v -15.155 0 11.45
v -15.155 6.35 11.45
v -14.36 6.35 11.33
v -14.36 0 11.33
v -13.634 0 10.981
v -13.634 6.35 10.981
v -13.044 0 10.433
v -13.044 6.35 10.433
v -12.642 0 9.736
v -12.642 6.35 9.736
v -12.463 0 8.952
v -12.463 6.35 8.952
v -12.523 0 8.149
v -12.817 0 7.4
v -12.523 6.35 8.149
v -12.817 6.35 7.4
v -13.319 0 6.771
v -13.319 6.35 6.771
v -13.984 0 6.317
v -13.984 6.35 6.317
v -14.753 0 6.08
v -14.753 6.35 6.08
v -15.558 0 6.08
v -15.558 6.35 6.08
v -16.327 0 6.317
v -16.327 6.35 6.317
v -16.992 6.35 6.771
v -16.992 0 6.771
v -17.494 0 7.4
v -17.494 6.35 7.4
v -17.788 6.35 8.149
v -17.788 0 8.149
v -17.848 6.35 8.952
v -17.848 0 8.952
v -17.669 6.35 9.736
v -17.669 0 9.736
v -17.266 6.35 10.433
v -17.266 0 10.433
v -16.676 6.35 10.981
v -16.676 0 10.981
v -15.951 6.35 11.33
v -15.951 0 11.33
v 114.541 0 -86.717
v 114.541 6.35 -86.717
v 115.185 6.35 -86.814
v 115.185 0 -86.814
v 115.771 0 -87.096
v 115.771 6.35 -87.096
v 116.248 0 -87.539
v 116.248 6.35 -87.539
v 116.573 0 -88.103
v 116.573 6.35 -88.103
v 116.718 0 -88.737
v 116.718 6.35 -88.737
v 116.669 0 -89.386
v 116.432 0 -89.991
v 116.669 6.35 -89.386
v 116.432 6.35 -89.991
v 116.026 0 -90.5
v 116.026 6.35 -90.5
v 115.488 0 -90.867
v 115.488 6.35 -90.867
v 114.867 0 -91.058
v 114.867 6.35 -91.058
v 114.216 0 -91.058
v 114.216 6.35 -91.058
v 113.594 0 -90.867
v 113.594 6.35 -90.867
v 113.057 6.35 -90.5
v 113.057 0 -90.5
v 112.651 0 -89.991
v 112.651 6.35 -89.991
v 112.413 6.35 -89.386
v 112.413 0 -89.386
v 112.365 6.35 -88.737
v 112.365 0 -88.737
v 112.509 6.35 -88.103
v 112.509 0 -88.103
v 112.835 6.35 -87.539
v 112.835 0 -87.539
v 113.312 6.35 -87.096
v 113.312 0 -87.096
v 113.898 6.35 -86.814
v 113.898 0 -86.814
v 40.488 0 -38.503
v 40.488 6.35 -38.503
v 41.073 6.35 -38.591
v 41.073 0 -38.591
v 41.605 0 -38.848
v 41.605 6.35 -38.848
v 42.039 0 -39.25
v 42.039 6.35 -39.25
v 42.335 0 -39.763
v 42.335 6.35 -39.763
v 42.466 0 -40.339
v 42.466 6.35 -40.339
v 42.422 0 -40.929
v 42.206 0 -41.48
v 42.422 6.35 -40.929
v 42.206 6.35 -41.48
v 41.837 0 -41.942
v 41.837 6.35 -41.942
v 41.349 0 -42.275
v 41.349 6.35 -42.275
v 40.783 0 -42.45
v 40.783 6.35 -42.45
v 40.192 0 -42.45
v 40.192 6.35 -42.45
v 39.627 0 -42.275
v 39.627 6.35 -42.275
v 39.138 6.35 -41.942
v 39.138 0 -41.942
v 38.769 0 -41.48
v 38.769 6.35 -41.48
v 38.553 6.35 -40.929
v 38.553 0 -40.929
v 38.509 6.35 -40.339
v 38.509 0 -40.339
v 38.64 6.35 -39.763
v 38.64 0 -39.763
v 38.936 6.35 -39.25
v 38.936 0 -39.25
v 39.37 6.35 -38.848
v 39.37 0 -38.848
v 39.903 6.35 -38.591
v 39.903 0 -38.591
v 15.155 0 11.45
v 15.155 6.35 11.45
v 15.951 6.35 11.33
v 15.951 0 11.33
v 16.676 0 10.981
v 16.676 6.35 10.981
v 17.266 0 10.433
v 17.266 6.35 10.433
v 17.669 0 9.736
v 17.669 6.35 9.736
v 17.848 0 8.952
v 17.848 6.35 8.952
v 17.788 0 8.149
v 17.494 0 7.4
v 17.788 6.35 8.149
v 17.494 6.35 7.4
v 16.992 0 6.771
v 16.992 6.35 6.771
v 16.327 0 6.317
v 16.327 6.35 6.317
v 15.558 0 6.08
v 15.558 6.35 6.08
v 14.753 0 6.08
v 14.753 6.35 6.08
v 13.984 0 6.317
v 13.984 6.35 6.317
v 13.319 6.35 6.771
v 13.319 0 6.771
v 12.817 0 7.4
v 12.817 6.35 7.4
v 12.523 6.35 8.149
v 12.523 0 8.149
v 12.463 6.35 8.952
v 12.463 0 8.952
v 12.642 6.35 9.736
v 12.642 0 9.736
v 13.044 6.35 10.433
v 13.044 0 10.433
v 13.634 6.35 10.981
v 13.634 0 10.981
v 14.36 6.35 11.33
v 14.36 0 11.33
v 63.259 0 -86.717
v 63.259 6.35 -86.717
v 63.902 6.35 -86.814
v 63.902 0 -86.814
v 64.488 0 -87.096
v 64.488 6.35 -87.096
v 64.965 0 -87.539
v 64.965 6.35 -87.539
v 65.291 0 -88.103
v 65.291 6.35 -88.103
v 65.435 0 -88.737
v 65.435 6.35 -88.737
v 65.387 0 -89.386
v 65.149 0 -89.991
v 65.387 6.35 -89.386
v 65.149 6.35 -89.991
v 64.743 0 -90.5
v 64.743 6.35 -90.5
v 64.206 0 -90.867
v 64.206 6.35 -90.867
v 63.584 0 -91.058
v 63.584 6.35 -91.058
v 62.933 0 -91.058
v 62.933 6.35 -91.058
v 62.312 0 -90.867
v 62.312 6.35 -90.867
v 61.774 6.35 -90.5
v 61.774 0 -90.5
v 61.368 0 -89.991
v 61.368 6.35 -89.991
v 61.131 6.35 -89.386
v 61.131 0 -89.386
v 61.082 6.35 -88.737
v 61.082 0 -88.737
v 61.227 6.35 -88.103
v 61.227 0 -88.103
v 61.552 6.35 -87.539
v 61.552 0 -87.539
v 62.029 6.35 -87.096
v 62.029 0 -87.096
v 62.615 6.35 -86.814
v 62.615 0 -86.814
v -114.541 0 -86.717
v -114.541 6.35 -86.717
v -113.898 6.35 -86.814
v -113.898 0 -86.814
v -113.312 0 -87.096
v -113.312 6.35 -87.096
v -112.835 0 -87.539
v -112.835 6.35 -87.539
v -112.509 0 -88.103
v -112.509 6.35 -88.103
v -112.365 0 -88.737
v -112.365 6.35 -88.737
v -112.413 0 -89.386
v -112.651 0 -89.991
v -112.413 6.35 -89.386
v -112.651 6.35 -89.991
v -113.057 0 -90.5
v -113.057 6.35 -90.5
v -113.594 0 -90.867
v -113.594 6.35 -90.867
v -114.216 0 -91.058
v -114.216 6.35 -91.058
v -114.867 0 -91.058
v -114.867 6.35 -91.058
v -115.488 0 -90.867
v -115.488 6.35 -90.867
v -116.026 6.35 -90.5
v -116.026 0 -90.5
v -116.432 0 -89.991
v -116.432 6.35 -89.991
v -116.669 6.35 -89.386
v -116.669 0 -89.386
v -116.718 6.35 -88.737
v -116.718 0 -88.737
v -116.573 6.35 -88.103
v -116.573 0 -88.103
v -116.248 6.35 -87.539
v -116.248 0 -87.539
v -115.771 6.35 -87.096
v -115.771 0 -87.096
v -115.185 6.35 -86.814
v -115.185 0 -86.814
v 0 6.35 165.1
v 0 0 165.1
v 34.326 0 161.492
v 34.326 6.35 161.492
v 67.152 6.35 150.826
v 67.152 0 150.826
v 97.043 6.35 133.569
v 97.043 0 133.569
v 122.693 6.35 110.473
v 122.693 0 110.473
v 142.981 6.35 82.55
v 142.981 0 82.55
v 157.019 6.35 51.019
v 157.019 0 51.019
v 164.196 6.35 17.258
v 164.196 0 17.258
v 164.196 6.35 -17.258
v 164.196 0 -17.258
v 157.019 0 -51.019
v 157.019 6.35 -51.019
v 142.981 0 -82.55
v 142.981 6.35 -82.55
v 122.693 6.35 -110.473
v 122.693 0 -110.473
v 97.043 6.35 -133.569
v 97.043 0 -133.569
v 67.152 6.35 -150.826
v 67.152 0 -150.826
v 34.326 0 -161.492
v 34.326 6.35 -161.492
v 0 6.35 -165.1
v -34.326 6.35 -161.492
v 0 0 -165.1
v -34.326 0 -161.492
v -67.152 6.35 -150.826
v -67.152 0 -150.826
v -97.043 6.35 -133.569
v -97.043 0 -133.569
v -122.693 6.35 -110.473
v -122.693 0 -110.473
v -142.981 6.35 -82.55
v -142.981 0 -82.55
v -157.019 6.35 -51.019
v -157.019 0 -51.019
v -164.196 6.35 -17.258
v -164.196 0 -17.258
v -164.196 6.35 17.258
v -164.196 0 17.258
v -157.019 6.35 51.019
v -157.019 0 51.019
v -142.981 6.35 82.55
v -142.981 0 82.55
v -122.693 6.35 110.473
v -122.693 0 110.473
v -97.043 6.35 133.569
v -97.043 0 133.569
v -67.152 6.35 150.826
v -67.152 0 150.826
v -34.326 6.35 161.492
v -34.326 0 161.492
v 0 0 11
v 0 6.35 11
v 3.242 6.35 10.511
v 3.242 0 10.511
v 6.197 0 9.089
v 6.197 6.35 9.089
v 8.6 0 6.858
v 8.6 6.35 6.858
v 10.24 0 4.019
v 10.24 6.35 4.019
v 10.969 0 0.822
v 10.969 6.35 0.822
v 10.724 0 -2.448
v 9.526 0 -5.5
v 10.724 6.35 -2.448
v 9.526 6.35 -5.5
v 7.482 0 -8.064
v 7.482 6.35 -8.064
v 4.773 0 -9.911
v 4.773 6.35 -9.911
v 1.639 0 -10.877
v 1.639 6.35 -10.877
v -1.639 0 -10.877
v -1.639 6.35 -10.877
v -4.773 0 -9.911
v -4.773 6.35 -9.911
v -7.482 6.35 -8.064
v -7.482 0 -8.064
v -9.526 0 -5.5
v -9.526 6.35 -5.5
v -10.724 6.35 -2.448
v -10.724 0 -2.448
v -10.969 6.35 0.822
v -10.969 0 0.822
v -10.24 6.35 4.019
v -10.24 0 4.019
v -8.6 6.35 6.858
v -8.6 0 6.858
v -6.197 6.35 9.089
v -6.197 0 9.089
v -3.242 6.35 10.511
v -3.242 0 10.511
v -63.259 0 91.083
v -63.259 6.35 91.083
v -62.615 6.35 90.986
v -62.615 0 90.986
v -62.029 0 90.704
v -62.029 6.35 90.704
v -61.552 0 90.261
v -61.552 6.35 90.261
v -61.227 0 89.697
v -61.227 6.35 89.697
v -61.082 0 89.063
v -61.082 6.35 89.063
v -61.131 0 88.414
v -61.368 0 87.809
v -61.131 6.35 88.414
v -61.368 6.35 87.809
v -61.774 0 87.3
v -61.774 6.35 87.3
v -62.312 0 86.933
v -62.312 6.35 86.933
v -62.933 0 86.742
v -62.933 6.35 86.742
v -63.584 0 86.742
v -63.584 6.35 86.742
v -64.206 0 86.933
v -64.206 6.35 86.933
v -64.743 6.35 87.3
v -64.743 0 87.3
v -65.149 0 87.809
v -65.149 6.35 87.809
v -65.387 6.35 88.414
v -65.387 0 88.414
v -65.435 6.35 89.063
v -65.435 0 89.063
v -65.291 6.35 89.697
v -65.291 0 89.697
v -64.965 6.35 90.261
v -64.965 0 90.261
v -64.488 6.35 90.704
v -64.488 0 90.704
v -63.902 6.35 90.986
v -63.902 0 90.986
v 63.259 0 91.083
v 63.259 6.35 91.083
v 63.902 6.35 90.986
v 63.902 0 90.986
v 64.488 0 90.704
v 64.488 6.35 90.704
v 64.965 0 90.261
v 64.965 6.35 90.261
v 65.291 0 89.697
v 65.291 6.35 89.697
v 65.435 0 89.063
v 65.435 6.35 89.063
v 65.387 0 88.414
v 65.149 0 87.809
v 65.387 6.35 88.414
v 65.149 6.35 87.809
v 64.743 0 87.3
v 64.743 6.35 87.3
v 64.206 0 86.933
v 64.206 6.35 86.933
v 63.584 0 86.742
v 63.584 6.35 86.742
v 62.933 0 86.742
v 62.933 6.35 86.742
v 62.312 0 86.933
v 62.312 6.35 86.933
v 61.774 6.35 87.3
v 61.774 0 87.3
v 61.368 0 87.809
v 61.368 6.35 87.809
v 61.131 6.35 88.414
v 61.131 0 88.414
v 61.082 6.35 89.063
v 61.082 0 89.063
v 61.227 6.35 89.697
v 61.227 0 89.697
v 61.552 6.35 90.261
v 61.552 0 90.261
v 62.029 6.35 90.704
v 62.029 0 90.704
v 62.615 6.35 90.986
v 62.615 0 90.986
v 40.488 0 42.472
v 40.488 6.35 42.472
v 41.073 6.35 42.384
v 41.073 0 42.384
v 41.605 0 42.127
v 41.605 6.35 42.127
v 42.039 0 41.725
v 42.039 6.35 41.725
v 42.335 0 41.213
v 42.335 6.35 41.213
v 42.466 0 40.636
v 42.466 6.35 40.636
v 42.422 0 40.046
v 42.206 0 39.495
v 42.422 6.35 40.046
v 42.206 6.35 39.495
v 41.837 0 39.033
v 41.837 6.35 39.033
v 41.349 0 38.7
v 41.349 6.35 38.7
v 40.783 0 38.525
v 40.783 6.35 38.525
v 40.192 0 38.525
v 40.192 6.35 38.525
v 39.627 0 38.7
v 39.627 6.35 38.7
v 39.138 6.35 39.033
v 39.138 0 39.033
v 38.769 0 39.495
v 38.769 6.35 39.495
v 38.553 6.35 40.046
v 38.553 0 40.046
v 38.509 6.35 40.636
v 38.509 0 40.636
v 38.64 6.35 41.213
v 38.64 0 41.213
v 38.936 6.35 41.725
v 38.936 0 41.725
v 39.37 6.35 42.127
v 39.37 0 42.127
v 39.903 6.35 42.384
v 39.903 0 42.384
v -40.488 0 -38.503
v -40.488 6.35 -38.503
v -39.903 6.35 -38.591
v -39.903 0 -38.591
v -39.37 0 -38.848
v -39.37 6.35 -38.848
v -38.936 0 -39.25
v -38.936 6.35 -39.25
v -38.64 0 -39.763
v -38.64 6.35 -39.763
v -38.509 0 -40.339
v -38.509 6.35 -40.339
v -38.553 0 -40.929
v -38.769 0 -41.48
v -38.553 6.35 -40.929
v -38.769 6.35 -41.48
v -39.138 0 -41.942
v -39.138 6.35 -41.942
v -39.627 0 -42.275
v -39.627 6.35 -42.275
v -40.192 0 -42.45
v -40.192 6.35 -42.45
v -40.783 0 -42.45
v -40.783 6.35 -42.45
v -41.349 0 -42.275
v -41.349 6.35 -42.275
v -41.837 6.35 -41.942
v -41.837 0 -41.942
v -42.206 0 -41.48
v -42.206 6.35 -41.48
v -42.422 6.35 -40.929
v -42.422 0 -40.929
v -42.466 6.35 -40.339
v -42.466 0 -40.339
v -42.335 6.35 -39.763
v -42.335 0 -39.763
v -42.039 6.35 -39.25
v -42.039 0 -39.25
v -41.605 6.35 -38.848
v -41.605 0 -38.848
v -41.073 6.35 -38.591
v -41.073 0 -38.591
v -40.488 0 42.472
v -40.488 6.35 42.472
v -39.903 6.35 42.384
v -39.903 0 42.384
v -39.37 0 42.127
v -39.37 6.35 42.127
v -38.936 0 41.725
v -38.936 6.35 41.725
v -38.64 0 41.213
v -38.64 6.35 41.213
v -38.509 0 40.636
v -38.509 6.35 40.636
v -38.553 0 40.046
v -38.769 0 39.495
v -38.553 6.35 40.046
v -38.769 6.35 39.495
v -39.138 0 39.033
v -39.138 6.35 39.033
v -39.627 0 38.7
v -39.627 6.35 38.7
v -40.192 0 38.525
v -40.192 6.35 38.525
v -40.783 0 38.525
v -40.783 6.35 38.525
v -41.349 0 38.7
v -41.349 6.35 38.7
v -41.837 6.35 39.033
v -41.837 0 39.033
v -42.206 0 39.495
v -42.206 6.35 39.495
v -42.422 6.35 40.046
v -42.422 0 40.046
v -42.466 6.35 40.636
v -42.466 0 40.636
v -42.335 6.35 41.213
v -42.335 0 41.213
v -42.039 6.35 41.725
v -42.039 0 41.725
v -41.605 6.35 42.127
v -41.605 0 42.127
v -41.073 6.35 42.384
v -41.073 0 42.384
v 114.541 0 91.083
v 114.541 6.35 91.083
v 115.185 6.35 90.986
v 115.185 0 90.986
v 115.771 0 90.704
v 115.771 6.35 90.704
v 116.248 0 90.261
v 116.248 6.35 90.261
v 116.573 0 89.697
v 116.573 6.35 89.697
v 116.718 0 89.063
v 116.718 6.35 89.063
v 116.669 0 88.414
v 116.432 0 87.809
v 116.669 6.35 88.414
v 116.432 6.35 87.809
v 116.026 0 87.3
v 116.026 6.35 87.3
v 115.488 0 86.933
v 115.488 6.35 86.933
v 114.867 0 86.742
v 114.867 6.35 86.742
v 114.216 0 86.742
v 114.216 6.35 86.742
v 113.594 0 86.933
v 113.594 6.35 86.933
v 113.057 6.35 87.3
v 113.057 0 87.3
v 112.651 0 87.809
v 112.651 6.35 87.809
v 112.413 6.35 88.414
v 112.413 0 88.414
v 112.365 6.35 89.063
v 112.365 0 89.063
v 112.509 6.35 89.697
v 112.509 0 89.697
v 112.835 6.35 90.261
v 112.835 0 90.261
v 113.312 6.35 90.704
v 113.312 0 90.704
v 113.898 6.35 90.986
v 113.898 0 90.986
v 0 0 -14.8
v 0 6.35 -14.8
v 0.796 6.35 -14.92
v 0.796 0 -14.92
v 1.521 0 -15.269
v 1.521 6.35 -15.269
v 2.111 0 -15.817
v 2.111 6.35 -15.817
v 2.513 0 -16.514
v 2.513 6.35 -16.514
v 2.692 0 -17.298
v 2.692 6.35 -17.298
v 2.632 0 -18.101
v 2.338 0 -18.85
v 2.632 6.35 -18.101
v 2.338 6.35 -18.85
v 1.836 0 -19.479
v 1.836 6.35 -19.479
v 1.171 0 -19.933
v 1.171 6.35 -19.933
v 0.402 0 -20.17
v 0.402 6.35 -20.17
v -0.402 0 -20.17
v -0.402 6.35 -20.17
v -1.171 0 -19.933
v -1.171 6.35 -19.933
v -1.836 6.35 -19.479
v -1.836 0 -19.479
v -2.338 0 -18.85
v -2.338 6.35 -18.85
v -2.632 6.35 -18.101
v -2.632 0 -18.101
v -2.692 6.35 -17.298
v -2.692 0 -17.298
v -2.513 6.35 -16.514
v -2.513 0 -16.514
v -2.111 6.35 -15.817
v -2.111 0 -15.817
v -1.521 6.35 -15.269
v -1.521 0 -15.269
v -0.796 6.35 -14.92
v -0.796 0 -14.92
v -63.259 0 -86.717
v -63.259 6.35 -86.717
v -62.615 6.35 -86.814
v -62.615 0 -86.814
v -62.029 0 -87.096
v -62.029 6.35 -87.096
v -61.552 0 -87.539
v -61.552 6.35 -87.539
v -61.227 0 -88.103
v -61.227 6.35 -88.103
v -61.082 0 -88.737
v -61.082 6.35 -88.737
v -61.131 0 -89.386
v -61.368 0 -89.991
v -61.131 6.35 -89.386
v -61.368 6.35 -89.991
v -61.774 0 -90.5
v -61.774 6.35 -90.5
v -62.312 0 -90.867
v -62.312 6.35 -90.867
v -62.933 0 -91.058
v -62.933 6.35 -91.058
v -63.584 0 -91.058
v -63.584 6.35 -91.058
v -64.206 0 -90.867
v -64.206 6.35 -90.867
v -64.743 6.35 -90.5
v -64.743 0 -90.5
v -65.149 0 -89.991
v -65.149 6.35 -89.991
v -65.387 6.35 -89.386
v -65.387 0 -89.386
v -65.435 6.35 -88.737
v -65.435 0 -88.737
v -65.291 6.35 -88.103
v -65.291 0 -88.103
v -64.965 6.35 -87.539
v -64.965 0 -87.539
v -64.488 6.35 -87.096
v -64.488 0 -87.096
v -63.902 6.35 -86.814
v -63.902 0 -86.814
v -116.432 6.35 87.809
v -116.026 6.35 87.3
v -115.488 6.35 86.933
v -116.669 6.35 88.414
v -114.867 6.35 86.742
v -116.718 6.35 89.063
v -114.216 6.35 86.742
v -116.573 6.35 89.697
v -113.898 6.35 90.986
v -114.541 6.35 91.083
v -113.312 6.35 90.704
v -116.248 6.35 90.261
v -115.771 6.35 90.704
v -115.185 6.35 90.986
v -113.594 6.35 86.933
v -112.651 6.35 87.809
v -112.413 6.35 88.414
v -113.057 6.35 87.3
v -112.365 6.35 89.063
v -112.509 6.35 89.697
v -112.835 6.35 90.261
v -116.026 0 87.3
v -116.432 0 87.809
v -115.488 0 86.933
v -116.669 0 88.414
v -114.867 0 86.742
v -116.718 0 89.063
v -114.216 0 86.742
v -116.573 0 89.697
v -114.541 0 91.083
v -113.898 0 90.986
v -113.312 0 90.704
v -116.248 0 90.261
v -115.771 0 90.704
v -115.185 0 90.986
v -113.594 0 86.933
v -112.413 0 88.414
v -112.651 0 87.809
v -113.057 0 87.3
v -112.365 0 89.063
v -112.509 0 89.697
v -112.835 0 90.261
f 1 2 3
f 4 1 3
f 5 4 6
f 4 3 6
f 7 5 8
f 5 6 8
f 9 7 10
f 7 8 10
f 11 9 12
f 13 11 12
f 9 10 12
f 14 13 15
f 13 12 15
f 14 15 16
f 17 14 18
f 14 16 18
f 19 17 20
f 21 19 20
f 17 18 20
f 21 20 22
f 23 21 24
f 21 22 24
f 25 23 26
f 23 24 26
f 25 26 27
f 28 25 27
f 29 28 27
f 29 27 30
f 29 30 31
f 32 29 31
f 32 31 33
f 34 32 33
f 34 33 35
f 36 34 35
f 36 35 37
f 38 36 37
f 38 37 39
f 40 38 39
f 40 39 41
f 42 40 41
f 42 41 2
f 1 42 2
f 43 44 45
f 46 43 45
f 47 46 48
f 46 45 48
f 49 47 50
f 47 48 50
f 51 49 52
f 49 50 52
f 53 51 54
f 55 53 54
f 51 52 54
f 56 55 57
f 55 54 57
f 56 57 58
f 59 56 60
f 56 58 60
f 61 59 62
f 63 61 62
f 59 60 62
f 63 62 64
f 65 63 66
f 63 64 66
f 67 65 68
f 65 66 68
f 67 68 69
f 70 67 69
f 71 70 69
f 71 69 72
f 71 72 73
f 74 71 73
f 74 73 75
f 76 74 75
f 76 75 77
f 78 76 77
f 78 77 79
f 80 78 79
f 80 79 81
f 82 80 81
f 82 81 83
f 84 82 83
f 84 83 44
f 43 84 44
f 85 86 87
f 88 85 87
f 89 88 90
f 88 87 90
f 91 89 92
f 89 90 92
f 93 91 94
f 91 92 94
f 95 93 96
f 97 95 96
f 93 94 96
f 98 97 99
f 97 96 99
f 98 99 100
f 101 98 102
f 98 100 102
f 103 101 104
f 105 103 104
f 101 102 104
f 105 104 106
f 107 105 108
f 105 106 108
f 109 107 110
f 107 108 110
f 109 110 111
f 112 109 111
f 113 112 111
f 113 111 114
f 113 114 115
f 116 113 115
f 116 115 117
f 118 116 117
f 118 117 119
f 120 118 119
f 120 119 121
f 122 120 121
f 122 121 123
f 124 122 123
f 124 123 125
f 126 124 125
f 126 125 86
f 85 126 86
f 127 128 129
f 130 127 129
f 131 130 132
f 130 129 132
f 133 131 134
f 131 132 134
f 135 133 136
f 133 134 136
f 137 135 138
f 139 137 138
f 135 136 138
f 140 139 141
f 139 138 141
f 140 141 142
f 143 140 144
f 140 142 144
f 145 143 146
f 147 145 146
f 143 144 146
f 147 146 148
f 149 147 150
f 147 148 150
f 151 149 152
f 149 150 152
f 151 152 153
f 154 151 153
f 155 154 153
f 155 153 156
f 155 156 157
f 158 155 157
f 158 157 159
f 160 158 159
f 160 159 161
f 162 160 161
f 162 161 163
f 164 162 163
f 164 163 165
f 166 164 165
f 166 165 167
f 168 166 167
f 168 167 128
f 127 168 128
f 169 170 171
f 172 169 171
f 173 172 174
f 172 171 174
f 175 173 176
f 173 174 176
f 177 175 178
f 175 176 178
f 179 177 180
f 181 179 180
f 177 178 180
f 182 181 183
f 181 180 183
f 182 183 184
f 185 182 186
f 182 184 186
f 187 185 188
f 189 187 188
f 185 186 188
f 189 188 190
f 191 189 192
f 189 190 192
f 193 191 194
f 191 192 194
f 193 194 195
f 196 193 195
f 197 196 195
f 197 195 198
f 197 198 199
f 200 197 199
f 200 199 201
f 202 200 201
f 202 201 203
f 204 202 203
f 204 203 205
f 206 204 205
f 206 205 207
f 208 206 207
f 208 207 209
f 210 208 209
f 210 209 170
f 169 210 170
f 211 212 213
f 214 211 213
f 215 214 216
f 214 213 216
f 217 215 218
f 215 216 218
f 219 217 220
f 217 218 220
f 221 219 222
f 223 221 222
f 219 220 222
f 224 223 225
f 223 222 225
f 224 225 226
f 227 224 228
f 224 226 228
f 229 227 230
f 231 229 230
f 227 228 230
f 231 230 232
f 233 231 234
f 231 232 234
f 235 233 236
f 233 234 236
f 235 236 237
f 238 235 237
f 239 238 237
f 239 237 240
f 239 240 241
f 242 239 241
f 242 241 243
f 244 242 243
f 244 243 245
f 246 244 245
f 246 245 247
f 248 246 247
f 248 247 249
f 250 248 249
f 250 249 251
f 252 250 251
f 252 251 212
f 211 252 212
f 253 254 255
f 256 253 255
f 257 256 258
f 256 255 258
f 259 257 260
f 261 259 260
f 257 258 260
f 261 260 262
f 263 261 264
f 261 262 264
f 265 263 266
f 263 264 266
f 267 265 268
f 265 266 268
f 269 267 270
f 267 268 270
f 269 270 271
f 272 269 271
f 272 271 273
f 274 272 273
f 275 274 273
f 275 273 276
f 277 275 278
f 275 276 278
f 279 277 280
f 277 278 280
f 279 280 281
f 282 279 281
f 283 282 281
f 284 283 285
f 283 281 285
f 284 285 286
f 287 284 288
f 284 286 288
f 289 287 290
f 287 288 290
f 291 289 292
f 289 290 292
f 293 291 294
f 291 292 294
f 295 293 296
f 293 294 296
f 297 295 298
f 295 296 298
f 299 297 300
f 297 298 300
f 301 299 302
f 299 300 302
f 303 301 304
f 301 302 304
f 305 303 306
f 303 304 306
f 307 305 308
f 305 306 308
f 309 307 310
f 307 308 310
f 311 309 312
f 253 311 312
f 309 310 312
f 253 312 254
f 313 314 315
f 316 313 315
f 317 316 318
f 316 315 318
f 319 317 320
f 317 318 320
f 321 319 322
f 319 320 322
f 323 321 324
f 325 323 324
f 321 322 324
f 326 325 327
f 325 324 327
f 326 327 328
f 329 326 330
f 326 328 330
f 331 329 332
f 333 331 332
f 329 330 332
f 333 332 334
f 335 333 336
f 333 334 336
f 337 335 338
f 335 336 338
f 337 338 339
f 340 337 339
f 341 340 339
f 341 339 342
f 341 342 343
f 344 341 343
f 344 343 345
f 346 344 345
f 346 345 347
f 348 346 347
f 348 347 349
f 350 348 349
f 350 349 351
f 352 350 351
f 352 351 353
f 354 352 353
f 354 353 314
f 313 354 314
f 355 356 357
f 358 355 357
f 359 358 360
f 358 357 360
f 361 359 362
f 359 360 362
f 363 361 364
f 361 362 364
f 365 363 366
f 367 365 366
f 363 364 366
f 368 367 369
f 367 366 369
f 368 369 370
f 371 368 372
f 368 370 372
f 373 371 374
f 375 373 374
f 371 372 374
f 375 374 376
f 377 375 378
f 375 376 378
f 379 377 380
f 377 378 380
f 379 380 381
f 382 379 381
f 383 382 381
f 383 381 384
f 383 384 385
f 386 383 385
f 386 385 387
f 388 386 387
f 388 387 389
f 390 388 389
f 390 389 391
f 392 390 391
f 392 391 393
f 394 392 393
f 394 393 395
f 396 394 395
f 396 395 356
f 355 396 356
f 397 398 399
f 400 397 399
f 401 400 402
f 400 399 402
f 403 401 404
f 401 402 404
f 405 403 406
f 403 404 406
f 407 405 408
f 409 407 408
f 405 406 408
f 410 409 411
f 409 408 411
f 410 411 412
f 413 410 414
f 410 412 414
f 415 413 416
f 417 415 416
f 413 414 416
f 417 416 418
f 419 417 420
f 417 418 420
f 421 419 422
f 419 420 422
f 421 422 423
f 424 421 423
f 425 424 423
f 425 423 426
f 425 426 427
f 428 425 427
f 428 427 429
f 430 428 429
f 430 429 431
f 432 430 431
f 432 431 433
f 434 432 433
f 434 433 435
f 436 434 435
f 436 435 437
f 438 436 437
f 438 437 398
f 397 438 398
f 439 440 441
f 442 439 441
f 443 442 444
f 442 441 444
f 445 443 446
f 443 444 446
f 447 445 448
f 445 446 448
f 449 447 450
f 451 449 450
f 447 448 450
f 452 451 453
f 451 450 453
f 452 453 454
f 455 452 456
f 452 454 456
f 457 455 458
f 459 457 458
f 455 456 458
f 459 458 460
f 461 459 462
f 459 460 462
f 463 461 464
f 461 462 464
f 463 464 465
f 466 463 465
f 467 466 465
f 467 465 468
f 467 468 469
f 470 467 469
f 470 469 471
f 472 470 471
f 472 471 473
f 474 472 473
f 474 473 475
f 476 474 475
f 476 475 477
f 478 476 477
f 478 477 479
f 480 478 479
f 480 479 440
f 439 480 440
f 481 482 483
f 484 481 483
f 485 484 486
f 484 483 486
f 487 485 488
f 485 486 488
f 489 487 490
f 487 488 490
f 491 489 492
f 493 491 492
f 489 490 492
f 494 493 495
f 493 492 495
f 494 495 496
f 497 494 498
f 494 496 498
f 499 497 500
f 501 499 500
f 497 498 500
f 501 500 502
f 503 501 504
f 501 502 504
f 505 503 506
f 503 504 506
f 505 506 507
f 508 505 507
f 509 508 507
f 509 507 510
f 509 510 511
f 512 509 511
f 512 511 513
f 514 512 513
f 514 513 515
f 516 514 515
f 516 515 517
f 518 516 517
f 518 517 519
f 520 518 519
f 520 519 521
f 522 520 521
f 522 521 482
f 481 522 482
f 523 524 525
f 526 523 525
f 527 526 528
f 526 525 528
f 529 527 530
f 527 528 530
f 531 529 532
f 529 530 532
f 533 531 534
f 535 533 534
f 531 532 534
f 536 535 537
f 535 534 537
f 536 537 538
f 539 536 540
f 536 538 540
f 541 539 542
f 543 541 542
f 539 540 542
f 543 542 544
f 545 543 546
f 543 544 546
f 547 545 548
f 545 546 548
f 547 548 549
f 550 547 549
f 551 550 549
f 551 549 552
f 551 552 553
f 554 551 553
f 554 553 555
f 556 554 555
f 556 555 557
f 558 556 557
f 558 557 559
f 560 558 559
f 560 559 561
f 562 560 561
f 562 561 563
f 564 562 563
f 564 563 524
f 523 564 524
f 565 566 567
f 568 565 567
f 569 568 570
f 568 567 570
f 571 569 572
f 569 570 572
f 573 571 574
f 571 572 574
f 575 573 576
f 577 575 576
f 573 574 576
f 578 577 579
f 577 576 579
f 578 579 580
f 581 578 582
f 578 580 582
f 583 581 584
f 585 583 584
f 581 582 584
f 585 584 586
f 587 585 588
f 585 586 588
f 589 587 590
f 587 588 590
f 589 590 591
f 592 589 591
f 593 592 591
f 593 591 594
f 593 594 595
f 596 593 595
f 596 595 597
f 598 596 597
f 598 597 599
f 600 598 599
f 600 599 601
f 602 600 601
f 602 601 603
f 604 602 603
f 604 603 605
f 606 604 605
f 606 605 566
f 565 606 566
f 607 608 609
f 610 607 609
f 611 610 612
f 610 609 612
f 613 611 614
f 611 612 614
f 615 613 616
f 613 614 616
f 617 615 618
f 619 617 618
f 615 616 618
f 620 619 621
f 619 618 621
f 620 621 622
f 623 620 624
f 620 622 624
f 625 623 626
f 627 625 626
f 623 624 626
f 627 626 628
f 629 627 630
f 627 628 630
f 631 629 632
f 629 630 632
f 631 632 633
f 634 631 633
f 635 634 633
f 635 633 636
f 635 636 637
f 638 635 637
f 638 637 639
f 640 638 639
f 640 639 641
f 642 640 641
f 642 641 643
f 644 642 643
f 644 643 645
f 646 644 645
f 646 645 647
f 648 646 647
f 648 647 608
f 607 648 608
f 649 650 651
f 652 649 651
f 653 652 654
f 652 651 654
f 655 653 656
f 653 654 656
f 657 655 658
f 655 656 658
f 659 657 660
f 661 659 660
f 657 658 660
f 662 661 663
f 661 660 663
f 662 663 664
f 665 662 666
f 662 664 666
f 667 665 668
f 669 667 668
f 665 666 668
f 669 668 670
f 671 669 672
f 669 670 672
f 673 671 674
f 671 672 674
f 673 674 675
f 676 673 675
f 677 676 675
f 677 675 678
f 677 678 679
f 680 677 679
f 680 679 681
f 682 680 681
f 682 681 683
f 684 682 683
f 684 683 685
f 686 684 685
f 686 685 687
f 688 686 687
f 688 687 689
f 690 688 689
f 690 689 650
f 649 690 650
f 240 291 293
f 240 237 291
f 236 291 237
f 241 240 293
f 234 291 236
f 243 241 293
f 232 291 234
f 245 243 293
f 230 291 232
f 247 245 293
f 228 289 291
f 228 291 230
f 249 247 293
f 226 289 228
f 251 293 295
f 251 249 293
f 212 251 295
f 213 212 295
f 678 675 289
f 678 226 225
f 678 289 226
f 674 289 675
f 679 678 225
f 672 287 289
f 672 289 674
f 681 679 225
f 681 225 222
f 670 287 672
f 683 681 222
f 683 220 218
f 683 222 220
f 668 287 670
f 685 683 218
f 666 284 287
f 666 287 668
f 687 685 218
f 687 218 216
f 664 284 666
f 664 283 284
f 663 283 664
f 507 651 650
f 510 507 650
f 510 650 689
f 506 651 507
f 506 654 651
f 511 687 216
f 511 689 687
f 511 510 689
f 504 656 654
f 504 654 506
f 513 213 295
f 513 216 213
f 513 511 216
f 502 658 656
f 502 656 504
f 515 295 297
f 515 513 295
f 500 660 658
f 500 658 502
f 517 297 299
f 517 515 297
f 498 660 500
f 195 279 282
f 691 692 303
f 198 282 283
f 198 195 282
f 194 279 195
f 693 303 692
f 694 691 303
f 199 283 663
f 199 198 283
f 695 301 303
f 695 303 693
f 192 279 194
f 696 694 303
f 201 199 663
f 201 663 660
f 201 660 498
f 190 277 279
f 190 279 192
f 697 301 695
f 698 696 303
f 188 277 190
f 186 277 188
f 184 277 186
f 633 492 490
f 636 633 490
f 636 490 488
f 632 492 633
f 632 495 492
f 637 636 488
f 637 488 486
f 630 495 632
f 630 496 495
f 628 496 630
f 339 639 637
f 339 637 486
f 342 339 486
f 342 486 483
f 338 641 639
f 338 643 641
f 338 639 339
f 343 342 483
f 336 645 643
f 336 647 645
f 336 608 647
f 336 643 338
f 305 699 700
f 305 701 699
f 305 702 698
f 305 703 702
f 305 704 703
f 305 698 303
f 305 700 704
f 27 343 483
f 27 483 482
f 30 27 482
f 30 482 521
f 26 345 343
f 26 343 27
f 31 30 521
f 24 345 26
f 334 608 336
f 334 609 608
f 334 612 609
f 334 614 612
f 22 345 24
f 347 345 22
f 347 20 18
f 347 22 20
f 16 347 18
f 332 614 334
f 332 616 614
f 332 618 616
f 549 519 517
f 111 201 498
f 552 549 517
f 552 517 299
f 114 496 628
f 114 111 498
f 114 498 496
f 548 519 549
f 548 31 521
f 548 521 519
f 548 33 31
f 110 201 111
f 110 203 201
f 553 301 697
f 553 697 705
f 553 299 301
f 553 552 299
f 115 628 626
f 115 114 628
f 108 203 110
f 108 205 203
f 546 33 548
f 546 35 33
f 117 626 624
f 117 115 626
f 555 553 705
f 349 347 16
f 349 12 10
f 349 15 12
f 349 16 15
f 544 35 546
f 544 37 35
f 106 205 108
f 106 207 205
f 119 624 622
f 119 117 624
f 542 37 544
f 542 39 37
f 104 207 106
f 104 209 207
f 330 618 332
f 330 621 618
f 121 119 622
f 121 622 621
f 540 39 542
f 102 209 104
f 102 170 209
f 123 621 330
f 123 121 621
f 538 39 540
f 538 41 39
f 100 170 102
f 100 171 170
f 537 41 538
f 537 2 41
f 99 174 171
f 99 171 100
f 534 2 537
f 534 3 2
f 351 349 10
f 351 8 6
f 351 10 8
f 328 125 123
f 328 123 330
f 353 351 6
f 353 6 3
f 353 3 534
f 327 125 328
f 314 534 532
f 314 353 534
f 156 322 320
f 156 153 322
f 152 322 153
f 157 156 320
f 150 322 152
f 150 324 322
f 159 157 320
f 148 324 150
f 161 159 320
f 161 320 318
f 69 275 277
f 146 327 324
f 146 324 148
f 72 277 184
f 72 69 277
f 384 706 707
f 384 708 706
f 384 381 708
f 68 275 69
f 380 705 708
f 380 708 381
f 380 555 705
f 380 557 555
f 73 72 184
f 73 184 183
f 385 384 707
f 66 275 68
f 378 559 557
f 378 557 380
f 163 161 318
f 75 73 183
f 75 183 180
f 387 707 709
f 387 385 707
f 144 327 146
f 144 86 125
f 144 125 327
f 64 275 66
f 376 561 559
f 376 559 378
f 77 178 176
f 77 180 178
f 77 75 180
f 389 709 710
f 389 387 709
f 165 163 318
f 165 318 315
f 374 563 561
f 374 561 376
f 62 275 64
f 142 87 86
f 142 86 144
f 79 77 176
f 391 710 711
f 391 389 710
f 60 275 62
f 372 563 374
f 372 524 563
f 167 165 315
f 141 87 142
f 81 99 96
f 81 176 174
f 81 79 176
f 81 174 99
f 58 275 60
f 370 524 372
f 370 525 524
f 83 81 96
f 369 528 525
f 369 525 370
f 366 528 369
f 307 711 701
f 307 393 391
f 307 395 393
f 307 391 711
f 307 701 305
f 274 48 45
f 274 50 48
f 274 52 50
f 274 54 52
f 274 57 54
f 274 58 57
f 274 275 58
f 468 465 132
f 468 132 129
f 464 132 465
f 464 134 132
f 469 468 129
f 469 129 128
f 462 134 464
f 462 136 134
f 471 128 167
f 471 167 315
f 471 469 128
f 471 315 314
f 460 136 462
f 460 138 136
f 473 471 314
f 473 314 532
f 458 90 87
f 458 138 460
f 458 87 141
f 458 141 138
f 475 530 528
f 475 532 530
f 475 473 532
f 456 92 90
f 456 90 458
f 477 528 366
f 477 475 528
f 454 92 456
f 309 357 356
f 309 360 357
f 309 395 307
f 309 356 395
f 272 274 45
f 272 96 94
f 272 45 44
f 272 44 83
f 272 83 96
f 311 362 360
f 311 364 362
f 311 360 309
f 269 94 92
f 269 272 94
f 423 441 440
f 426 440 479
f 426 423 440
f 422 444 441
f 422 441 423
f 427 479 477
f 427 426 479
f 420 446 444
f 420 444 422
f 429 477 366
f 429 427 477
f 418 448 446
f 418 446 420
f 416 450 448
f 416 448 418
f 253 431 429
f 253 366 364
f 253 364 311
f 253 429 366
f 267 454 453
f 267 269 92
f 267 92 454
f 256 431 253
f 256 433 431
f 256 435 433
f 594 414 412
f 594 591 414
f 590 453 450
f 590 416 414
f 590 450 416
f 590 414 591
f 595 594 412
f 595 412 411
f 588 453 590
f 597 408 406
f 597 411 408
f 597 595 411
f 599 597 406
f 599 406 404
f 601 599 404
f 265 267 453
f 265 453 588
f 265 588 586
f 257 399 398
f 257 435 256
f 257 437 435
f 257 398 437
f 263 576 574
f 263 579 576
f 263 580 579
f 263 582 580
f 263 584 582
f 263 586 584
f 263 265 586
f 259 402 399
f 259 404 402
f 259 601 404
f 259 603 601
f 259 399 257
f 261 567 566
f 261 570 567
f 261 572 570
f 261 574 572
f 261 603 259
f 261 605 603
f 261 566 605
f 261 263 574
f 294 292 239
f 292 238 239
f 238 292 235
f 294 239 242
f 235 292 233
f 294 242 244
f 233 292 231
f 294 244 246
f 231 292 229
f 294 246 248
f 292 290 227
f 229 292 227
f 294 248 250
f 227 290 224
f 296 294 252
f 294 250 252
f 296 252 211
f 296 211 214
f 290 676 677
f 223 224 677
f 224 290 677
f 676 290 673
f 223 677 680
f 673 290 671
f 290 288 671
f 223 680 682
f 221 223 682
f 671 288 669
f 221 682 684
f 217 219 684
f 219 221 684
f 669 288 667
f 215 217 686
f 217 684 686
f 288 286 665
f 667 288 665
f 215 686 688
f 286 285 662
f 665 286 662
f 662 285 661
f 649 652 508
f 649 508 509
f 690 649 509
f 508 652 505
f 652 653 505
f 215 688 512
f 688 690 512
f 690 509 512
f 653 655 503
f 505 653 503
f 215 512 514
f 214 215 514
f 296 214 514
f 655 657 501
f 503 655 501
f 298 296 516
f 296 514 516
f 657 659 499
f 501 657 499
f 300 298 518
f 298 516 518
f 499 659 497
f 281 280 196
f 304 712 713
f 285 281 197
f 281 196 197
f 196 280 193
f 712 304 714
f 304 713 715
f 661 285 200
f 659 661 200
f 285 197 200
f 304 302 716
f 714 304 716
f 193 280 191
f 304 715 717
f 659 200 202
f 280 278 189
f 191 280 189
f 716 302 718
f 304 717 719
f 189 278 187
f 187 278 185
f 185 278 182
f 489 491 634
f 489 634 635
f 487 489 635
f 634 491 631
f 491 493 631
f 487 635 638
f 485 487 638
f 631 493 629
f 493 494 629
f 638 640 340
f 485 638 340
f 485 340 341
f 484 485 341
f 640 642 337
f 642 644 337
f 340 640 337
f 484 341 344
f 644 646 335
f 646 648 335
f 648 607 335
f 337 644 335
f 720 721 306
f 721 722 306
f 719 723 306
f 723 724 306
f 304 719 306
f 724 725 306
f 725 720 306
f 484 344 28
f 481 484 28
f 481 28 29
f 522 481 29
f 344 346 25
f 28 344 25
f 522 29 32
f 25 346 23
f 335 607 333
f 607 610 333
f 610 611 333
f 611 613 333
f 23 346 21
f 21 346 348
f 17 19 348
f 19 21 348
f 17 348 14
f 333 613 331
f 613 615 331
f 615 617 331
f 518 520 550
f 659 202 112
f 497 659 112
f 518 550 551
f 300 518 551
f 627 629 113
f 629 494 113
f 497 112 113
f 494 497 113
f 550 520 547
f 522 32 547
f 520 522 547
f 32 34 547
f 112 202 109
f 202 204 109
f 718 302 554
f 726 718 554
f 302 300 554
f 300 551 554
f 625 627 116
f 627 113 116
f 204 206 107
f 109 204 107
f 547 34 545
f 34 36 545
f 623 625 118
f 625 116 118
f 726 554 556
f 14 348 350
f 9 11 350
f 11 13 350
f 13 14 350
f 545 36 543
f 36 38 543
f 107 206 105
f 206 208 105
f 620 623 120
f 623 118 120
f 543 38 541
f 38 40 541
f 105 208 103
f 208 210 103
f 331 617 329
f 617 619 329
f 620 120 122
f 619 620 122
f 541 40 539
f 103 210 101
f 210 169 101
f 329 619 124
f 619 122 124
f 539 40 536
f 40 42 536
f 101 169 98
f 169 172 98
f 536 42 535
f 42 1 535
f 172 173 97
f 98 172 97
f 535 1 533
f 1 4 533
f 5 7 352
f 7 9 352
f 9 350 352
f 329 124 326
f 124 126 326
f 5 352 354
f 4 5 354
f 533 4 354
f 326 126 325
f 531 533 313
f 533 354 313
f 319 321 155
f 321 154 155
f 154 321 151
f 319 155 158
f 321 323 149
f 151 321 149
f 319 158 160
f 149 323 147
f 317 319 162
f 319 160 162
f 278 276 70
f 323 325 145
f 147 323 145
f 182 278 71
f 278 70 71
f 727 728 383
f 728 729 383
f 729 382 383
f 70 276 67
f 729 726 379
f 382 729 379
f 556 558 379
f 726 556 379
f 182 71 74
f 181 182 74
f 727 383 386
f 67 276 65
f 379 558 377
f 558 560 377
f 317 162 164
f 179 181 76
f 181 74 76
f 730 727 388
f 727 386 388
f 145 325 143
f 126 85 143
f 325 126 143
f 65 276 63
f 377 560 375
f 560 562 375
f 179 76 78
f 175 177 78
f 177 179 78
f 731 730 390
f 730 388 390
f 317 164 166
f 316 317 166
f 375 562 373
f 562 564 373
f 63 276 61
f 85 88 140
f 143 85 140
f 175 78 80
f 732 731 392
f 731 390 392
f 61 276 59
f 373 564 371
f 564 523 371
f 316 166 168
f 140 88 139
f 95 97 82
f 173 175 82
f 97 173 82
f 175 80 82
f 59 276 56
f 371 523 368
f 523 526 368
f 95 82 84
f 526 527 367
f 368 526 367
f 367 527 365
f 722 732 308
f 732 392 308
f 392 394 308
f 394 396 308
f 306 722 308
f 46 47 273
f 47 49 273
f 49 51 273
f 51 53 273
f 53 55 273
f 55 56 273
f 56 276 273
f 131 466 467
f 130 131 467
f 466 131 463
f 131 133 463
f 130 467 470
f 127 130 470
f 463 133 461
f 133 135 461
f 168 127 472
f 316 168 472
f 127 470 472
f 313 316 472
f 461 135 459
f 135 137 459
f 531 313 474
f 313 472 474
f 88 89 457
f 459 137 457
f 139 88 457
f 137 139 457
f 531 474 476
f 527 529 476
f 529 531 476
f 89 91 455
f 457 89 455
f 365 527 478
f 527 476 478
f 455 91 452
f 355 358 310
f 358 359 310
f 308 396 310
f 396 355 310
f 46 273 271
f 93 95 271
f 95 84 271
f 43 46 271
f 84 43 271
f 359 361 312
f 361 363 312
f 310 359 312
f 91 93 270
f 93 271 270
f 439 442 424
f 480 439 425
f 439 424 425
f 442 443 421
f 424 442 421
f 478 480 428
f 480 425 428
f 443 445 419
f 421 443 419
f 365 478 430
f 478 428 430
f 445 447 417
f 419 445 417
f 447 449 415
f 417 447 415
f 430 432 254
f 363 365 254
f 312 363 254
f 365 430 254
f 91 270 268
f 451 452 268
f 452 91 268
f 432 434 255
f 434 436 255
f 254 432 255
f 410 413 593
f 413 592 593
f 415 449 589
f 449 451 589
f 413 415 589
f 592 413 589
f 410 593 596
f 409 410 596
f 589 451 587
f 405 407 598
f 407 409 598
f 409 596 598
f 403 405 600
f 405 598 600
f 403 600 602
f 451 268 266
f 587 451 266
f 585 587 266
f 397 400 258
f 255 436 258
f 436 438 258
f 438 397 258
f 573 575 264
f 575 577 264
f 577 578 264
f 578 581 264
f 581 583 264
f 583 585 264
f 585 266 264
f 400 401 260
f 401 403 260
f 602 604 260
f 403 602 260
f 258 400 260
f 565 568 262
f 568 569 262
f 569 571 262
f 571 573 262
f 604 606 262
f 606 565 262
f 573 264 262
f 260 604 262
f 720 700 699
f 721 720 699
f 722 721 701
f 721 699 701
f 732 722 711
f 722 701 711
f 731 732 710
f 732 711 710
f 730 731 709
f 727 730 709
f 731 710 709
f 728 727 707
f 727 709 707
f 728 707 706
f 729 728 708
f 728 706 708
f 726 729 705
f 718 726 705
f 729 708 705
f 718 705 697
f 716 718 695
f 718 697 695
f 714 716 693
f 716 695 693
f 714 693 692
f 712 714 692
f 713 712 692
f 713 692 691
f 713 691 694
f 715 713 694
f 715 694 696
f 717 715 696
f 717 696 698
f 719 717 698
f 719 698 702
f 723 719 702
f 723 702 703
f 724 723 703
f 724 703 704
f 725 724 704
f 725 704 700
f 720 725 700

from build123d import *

# Parameters (mm, degrees)
SKETCH1_R           = 165.1
BOSS_EXTRUDE1_DEPTH = 6.35
SKETCH2_R           = 11
SKETCH2_R_2         = 1.984375
SKETCH2_R_3         = 2.7
CUT_EXTRUDE1_DEPTH  = 234.572991803
SKETCH3_R           = 2.1828125
CUT_EXTRUDE2_DEPTH  = 234.572991803


with BuildPart() as part:
    # Sketch1 → Boss-Extrude1 (new body)
    with BuildSketch(Plane(origin=(0, 0, 0), x_dir=(1, 0, 0), z_dir=(0, 1, 0))):
        with Locations(Location((0, 0, 0), (0, 0, 270))):
            Circle(SKETCH1_R)
    extrude(amount=BOSS_EXTRUDE1_DEPTH)

    # Sketch2 → Cut-Extrude1 (cut, through all)
    with BuildSketch(Plane(origin=(0, 6.35, 0), x_dir=(1, 0, 0), z_dir=(0, 1, 0))):
        with Locations(Location((0, 0, 0), (0, 0, 270))):
            Circle(SKETCH2_R)
        with Locations(Location((-40.4876, 40.4876, 0), (0, 0, 270))):
            Circle(SKETCH2_R_2)
        with Locations(Location((-40.4876, -40.4876, 0), (0, 0, 270))):
            Circle(SKETCH2_R_2)
        with Locations(Location((40.4876, -40.4876, 0), (0, 0, 270))):
            Circle(SKETCH2_R_2)
        with Locations(Location((40.4876, 40.4876, 0), (0, 0, 270))):
            Circle(SKETCH2_R_2)
        with Locations(Location((0, 17.5, 0), (0, 0, 270))):
            Circle(SKETCH2_R_3)
        with Locations(Location((-15.155444566, -8.75, 0), (0, 0, 270))):
            Circle(SKETCH2_R_3)
        with Locations(Location((15.155444566, -8.75, 0), (0, 0, 270))):
            Circle(SKETCH2_R_3)
    extrude(amount=-CUT_EXTRUDE1_DEPTH, mode=Mode.SUBTRACT)

    # Sketch3 → Cut-Extrude2 (cut, through all)
    with BuildSketch(Plane(origin=(0, 6.35, 0), x_dir=(1, 0, 0), z_dir=(0, 1, 0))):
        with Locations(Location((-114.5413, 88.9, 0), (0, 0, 270))):
            Circle(SKETCH3_R)
        with Locations(Location((-63.2587, 88.9, 0), (0, 0, 270))):
            Circle(SKETCH3_R)
        with Locations(Location((63.2587, 88.9, 0), (0, 0, 270))):
            Circle(SKETCH3_R)
        with Locations(Location((114.5413, 88.9, 0), (0, 0, 270))):
            Circle(SKETCH3_R)
        with Locations(Location((114.5413, -88.9, 0), (0, 0, 270))):
            Circle(SKETCH3_R)
        with Locations(Location((63.2587, -88.9, 0), (0, 0, 270))):
            Circle(SKETCH3_R)
        with Locations(Location((-63.2587, -88.9, 0), (0, 0, 270))):
            Circle(SKETCH3_R)
        with Locations(Location((-114.5413, -88.9, 0), (0, 0, 270))):
            Circle(SKETCH3_R)
    extrude(amount=-CUT_EXTRUDE2_DEPTH, mode=Mode.SUBTRACT)


solid = part.part
